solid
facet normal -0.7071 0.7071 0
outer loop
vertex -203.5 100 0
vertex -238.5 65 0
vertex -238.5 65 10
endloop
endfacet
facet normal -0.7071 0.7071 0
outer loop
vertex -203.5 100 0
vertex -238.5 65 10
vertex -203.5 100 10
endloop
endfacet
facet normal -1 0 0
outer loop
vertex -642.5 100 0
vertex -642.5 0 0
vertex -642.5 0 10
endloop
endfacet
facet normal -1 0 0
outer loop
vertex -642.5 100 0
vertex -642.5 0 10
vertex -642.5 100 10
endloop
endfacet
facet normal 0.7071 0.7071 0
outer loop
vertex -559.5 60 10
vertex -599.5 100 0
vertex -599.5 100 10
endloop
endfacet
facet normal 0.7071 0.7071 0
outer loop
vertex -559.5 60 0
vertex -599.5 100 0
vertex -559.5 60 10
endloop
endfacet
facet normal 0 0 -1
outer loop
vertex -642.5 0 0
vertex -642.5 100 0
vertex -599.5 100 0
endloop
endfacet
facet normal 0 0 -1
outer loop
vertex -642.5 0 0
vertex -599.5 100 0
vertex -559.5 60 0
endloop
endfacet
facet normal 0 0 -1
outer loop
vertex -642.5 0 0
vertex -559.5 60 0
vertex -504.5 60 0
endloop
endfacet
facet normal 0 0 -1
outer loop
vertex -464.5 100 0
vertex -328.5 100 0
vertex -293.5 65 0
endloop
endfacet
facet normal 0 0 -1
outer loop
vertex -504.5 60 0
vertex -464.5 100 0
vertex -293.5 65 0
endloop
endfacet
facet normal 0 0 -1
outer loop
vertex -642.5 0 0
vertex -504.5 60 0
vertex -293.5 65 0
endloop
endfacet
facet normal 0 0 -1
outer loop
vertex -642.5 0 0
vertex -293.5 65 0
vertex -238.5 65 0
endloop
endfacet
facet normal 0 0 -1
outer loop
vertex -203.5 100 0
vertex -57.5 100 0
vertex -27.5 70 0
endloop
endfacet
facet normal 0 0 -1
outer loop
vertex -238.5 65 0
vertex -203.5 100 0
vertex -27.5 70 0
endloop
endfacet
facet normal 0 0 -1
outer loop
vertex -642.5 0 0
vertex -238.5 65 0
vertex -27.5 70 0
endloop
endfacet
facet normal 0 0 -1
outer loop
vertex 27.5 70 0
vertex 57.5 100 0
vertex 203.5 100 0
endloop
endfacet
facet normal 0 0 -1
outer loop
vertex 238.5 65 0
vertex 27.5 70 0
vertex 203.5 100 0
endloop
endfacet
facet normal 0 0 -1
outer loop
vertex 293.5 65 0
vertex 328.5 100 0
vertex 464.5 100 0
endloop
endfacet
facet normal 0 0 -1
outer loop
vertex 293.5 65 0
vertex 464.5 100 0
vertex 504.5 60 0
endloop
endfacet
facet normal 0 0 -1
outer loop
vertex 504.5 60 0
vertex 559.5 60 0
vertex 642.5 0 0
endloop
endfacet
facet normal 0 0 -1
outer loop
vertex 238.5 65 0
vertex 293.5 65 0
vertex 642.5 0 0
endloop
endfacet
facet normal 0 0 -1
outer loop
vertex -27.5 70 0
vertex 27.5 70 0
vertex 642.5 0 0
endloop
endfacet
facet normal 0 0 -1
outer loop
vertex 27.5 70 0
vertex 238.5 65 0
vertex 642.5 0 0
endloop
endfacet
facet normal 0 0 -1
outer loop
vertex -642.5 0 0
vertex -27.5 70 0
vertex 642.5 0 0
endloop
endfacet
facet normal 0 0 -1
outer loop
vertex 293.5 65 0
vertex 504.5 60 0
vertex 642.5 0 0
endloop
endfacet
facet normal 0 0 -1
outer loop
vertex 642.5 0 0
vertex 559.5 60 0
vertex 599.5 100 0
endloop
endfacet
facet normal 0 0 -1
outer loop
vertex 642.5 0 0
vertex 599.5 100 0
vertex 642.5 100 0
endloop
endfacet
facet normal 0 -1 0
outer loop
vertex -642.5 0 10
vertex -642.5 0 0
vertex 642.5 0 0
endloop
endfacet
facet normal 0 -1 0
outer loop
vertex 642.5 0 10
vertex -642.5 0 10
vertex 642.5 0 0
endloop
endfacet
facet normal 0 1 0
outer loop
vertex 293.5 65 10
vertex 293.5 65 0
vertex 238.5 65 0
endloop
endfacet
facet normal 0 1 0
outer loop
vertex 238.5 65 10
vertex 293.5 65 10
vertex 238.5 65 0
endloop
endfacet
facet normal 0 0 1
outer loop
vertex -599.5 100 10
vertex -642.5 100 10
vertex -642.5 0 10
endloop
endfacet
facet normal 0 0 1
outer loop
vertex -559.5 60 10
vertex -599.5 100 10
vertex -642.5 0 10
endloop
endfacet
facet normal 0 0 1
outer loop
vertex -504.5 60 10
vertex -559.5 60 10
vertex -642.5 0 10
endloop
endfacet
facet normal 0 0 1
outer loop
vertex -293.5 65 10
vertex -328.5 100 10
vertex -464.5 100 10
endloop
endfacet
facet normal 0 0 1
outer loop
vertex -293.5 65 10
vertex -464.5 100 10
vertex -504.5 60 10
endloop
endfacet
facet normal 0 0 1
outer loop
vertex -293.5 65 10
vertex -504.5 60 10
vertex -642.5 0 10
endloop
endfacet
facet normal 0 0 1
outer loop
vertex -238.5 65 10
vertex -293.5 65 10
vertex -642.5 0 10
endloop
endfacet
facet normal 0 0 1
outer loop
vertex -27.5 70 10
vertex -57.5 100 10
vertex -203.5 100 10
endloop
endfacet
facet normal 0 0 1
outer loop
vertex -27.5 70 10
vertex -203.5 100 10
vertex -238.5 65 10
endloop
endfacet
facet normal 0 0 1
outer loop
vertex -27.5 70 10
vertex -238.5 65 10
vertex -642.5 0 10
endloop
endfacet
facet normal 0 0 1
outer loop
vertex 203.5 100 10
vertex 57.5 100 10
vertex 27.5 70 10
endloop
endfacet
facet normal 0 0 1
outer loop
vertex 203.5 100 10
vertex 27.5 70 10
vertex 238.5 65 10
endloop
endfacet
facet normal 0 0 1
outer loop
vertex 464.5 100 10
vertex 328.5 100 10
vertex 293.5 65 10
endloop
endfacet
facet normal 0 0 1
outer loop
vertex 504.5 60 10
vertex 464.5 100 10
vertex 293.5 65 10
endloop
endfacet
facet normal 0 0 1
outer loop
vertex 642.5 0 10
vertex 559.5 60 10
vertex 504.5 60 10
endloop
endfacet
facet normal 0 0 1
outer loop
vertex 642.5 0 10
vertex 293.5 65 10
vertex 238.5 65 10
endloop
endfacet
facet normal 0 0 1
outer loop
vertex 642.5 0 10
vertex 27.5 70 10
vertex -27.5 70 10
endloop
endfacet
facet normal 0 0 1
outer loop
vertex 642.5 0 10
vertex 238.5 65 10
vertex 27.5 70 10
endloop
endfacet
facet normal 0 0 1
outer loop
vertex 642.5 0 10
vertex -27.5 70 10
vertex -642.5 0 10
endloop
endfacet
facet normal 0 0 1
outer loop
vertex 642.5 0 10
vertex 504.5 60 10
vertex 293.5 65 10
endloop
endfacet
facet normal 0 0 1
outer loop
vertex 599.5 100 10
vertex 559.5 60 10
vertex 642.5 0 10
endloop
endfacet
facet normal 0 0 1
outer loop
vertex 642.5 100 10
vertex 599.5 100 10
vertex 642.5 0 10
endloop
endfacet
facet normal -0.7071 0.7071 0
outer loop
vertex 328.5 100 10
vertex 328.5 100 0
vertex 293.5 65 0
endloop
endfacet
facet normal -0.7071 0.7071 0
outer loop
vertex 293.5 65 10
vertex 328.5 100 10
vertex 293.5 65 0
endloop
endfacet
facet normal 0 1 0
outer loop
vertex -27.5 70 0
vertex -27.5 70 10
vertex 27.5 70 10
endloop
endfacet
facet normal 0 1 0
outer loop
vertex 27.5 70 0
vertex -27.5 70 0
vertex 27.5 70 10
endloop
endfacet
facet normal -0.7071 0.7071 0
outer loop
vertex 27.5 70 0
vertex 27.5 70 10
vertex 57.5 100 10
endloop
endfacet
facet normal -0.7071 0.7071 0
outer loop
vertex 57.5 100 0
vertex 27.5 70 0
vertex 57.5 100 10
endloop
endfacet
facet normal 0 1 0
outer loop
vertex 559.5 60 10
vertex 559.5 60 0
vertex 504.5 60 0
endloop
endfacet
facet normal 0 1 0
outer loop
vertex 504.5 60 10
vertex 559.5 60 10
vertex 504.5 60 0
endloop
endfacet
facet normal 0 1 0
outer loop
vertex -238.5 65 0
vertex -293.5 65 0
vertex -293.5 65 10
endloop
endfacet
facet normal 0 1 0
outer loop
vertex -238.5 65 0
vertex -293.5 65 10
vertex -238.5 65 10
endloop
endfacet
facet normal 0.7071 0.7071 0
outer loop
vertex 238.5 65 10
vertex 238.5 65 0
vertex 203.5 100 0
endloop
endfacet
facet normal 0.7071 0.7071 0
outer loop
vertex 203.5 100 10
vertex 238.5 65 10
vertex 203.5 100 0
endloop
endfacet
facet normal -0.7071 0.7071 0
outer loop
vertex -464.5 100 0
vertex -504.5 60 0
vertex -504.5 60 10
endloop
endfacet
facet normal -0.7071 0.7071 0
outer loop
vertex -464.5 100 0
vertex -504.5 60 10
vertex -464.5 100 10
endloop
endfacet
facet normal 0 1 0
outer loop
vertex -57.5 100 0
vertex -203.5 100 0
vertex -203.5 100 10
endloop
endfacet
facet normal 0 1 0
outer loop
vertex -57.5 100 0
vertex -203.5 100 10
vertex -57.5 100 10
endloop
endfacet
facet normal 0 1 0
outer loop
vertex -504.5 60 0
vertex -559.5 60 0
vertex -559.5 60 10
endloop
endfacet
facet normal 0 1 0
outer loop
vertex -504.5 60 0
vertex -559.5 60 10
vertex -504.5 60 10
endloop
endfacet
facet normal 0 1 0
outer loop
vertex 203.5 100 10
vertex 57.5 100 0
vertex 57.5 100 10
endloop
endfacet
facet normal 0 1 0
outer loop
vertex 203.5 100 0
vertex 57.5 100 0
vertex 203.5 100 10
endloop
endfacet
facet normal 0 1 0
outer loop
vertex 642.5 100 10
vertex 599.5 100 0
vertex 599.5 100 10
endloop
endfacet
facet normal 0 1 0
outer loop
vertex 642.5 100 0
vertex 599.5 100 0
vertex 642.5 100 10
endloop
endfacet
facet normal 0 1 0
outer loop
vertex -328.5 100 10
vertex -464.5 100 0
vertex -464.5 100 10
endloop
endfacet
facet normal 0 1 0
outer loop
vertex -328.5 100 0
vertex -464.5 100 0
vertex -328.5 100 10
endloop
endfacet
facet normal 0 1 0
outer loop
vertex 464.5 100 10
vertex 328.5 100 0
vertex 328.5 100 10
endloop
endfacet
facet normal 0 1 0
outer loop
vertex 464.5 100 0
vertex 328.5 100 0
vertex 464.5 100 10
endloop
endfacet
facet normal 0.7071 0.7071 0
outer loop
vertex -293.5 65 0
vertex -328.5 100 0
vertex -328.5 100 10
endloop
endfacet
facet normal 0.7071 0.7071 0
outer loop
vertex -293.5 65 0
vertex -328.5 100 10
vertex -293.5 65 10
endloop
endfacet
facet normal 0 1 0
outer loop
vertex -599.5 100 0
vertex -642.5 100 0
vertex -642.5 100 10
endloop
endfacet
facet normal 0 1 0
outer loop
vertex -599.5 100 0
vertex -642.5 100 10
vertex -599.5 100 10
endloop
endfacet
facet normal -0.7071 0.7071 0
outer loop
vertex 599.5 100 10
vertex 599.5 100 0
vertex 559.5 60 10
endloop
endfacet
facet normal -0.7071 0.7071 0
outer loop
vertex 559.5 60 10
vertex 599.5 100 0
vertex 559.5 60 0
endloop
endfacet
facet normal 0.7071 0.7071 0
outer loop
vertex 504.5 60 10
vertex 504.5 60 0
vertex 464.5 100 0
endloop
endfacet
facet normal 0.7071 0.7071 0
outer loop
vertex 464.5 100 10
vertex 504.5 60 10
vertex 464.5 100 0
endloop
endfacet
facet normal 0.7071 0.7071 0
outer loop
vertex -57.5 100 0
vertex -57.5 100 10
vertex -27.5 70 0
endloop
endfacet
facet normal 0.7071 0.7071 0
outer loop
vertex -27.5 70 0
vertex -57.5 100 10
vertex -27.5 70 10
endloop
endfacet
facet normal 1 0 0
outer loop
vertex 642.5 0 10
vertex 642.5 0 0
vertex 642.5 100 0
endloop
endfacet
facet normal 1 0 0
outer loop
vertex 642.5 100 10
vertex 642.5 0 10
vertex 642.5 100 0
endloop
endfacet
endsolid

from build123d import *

# Parameters (mm, degrees)
SKETCH1_W             = 1285
SKETCH1_H             = 100
BOSS_EXTRUDE1_DEPTH   = 10
CUT_EXTRUDE1_REACH    = 652.312
SKETCH_PATTERN1_DEPTH = 10


# Read off the part's stored shape, not the designer's step: Sketch-Pattern1
with BuildPart() as part:
    # Sketch1 → Boss-Extrude1 (new body)
    with BuildSketch(Plane.XY):
        with Locations((0, 50)):
            Rectangle(SKETCH1_W, SKETCH1_H)
    extrude(amount=BOSS_EXTRUDE1_DEPTH)

    # Sketch2 → Cut-Extrude1 (cut, up to next)
    with BuildSketch(Plane.XY.offset(10), mode=Mode.PRIVATE) as cut_extrude1_sk1:
        Polygon((-82.5, 125), (-27.5, 70), (27.5, 70), (82.5, 125), align=None)
    cut_extrude1_tool1 = extrude(cut_extrude1_sk1.sketch, amount=-CUT_EXTRUDE1_REACH, mode=Mode.PRIVATE) & part.part
    add(cut_extrude1_tool1.solids().sort_by_distance((0, 102.083333, 10))[0], mode=Mode.SUBTRACT)

    # Sketch-Pattern1 outline → Sketch-Pattern1 (cut)
    with BuildSketch(Plane.XY):
        Polygon((-559.5, 60), (-504.5, 60), (-464.5, 100), (-599.5, 100), align=None)
        Polygon((-203.5, 100), (-328.5, 100), (-293.5, 65), (-238.5, 65), align=None)
    sketch_pattern1 = extrude(amount=SKETCH_PATTERN1_DEPTH, mode=Mode.SUBTRACT)

    # Mirror1: Sketch-Pattern1 across plane
    add(sketch_pattern1.mirror(Plane(origin=(0, 0, 0), x_dir=(0, 0, 1), z_dir=(1, 0, 0))), mode=Mode.SUBTRACT)


solid = part.part
